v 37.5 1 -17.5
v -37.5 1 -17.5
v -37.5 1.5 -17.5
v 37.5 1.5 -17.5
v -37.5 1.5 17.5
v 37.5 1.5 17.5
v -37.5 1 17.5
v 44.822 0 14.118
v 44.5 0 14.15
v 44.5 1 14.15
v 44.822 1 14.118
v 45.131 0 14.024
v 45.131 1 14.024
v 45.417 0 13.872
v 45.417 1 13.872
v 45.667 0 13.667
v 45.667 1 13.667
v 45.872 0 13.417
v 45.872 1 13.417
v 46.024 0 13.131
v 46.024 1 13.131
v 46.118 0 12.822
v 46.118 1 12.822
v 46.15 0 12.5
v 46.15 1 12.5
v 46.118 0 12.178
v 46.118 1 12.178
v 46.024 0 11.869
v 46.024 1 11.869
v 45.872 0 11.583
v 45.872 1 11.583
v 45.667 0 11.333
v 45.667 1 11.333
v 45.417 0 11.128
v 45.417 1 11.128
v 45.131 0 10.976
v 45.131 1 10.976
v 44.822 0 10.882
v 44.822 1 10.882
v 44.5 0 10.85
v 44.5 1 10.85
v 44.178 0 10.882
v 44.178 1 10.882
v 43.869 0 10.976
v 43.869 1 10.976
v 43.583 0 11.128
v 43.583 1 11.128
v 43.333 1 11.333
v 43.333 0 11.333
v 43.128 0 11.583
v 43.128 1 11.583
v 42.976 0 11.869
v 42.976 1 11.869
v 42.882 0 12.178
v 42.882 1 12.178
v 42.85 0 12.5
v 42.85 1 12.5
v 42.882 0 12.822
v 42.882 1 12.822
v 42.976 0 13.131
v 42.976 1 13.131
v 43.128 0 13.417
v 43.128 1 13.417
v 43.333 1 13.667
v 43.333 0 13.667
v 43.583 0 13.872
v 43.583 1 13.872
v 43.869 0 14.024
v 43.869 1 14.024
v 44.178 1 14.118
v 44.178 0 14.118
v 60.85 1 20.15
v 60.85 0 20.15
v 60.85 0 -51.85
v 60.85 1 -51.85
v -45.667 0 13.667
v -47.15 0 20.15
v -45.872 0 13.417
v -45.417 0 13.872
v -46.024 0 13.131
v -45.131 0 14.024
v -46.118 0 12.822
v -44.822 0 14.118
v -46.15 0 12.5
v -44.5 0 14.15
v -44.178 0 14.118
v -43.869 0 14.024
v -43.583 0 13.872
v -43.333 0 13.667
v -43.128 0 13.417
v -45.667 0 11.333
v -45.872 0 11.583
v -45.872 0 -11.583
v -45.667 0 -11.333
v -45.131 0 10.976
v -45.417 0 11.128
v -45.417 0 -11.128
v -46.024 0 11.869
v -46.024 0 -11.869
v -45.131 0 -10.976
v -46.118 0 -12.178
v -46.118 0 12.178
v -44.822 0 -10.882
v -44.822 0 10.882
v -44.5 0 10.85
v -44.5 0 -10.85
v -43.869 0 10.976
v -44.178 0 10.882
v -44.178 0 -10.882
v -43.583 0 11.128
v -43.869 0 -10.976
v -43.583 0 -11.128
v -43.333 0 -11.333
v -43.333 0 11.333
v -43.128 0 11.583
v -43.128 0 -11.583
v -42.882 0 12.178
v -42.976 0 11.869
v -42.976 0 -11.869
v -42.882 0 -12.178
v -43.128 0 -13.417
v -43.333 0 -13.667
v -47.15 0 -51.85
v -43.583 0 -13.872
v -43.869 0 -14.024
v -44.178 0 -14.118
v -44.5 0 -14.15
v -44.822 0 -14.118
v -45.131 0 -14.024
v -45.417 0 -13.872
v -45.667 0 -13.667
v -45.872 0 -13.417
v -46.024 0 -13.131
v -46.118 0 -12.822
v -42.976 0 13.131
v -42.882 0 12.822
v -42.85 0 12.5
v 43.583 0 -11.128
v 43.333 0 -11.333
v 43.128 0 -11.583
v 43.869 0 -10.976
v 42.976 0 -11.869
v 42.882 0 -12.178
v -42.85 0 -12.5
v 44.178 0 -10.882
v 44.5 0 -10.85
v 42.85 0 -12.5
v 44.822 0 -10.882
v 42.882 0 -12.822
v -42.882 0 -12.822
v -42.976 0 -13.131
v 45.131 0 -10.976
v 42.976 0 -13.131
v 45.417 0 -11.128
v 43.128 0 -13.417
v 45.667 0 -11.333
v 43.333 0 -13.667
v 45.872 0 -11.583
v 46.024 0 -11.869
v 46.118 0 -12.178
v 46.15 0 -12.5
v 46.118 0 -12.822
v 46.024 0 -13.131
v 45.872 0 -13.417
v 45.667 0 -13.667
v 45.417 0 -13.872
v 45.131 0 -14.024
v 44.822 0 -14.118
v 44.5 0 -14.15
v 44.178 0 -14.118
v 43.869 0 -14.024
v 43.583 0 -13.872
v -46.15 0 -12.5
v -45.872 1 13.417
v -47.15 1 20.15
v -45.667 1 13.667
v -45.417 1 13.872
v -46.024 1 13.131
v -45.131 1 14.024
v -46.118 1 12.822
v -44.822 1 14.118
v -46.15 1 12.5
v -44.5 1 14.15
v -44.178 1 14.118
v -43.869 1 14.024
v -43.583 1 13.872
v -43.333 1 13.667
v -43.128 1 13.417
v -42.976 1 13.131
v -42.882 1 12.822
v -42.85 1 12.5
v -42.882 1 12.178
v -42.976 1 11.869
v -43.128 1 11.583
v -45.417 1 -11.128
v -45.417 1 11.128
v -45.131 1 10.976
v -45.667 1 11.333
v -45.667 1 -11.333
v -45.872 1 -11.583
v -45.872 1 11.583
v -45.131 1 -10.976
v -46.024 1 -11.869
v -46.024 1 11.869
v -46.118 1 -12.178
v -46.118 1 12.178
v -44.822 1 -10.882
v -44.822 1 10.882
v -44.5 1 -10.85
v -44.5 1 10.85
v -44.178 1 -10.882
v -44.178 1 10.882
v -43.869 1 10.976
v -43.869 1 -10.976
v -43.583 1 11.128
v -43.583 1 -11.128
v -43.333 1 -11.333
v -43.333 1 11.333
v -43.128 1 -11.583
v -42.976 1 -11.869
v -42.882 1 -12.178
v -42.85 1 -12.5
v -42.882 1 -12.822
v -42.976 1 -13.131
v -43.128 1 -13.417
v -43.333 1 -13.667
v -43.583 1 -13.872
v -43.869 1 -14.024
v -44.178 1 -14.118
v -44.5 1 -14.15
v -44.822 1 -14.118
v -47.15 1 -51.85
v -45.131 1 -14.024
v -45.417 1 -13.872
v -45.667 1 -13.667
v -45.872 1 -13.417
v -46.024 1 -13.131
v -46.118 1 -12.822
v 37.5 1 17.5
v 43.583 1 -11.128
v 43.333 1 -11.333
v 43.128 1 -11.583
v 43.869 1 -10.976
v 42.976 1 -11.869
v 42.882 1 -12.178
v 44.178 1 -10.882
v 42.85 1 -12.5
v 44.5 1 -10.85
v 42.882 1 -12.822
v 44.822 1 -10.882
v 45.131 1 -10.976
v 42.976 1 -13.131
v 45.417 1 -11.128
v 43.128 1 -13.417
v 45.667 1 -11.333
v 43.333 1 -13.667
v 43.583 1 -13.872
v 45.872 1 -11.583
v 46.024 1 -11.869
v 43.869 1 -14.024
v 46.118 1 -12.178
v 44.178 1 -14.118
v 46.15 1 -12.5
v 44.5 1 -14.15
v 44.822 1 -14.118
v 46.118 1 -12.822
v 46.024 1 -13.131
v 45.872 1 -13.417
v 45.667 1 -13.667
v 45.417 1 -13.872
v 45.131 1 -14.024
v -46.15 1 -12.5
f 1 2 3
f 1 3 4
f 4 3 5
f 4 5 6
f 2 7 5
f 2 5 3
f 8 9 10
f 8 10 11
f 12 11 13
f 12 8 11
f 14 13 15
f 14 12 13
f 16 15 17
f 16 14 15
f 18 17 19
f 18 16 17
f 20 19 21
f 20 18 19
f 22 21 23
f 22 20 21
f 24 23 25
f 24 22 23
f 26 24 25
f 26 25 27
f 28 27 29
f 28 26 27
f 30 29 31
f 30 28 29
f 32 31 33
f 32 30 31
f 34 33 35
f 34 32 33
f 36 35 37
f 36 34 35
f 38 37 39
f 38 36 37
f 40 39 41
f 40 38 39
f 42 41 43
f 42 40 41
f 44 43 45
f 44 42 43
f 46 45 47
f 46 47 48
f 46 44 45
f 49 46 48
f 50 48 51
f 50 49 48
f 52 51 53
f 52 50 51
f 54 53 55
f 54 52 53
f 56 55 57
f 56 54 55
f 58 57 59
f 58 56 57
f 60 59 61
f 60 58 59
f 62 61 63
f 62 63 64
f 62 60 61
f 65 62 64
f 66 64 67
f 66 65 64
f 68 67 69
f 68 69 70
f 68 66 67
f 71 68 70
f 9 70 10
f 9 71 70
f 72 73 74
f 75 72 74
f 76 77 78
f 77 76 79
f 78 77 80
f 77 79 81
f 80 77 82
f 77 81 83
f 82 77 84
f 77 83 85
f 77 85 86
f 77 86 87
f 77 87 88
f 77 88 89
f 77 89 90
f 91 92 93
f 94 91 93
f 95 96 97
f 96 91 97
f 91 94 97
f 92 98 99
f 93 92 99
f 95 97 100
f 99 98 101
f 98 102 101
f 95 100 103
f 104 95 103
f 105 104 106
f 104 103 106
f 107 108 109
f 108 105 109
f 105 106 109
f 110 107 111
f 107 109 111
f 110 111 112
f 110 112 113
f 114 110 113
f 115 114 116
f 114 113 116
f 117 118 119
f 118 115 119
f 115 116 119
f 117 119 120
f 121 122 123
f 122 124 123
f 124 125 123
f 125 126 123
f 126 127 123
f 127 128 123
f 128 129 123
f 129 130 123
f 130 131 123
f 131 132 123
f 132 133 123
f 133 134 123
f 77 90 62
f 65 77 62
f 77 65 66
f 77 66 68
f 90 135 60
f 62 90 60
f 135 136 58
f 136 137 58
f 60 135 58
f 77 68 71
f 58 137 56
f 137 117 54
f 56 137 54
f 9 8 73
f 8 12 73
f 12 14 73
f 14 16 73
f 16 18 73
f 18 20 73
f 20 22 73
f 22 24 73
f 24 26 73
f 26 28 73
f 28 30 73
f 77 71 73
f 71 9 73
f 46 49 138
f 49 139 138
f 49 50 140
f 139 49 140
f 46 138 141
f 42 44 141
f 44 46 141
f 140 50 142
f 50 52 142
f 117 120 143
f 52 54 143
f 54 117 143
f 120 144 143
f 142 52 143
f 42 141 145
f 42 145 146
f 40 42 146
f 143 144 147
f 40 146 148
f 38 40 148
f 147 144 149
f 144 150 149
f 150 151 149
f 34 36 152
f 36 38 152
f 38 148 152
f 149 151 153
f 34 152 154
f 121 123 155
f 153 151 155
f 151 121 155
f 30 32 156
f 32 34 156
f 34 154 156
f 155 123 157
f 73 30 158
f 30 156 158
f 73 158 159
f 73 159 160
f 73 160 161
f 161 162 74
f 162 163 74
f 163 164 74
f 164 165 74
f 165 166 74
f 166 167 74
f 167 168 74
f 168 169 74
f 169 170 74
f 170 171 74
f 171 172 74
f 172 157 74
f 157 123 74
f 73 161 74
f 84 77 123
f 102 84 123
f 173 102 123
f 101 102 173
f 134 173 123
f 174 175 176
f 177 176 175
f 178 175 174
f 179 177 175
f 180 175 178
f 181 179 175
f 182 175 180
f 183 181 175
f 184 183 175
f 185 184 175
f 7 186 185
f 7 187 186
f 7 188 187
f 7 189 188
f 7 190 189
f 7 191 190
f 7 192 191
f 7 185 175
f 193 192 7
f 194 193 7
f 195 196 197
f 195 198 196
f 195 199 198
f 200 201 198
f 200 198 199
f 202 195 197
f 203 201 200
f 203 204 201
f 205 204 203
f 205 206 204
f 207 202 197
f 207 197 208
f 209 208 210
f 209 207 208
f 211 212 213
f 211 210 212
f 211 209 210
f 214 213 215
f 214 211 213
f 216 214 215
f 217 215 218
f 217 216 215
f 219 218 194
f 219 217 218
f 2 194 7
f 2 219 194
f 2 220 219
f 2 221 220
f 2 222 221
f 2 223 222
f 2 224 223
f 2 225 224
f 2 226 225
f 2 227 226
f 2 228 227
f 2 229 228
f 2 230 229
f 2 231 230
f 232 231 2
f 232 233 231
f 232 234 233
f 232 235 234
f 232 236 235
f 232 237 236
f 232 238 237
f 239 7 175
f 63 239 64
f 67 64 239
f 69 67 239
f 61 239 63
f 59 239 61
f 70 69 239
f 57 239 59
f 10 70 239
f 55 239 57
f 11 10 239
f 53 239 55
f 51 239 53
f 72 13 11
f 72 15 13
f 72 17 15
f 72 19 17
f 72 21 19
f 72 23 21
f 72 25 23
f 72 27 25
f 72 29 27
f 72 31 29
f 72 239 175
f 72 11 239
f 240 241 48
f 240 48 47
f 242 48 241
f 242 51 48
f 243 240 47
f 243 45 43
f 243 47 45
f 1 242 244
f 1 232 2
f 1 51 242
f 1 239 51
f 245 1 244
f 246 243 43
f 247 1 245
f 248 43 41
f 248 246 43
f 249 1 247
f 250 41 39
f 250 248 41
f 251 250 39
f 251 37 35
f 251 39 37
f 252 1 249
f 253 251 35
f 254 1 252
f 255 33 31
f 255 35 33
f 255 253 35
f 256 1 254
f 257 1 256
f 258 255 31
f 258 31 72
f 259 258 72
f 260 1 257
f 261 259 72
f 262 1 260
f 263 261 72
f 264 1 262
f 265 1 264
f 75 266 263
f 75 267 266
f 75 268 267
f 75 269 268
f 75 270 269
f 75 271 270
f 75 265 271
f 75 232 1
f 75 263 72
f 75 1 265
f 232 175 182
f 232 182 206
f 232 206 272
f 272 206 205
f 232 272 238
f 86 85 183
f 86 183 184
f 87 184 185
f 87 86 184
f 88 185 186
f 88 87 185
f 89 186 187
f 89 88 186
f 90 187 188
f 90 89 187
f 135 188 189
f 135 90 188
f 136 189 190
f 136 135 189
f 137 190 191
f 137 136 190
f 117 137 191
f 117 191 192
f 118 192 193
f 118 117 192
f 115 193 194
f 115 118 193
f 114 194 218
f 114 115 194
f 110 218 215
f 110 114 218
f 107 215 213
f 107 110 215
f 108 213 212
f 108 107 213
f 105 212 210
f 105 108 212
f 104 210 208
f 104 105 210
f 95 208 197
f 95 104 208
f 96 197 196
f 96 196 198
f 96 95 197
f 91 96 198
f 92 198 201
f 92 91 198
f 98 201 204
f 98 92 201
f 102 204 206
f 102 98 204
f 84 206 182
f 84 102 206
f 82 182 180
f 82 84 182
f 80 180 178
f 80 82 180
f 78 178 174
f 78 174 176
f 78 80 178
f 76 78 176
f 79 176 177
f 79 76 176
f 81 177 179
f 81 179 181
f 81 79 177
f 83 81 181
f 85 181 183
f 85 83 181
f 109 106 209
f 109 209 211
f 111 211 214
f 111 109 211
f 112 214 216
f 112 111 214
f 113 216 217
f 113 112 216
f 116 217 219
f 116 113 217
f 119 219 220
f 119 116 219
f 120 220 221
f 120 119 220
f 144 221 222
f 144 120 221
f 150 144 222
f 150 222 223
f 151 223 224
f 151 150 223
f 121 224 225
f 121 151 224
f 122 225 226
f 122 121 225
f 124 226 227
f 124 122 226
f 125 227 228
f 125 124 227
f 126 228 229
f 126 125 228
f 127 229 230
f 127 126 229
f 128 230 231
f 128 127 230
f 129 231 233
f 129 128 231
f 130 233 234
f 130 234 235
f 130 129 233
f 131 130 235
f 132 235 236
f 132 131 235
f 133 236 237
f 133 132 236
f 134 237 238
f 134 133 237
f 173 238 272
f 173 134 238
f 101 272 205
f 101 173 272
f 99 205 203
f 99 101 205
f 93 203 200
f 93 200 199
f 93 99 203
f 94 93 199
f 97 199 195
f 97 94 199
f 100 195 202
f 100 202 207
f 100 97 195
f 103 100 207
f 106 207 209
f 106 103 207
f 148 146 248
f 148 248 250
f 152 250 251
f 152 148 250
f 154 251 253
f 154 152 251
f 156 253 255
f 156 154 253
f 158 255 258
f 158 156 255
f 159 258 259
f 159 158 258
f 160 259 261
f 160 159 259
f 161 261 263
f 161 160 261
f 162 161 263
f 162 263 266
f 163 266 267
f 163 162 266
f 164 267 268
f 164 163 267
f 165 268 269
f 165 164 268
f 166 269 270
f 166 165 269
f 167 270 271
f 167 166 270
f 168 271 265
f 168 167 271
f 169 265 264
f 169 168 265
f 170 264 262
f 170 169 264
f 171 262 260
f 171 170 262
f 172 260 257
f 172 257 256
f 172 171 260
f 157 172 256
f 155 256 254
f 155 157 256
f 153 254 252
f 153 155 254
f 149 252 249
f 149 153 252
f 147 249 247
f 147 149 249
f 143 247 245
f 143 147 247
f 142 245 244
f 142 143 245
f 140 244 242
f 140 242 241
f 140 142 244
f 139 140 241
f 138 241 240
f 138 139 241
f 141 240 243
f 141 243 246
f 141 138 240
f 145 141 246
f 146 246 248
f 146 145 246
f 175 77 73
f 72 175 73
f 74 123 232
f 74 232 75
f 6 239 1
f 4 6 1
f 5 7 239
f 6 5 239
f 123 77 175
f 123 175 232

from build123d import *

# Parameters (mm, degrees)
SKETCH1_W           = 108
SKETCH1_H           = 72
SKETCH1_R           = 1.65
BOSS_EXTRUDE1_DEPTH = 1
SKETCH2_W           = 75
SKETCH2_H           = 35
BOSS_EXTRUDE2_DEPTH = 0.5


with BuildPart() as part:
    # Sketch1 → Boss-Extrude1 (new body)
    with BuildSketch(Plane(origin=(0, 0, 0), x_dir=(1, 0, 0), z_dir=(0, 1, 0))):
        with Locations((6.85, 15.85)):
            Rectangle(SKETCH1_W, SKETCH1_H)
        with Locations(Location((-44.5, 12.5, 0), (0, 0, 270))):
            Circle(SKETCH1_R, mode=Mode.SUBTRACT)
        with Locations(Location((-44.5, -12.5, 0), (0, 0, 270))):
            Circle(SKETCH1_R, mode=Mode.SUBTRACT)
        with Locations(Location((44.5, 12.5, 0), (0, 0, 270))):
            Circle(SKETCH1_R, mode=Mode.SUBTRACT)
        with Locations(Location((44.5, -12.5, 0), (0, 0, 270))):
            Circle(SKETCH1_R, mode=Mode.SUBTRACT)
    extrude(amount=BOSS_EXTRUDE1_DEPTH)

    # Sketch2 → Boss-Extrude2 (add)
    with BuildSketch(Plane(origin=(0, 1, 0), x_dir=(1, 0, 0), z_dir=(0, 1, 0))):
        Rectangle(SKETCH2_W, SKETCH2_H)
    extrude(amount=BOSS_EXTRUDE2_DEPTH)


solid = part.part
